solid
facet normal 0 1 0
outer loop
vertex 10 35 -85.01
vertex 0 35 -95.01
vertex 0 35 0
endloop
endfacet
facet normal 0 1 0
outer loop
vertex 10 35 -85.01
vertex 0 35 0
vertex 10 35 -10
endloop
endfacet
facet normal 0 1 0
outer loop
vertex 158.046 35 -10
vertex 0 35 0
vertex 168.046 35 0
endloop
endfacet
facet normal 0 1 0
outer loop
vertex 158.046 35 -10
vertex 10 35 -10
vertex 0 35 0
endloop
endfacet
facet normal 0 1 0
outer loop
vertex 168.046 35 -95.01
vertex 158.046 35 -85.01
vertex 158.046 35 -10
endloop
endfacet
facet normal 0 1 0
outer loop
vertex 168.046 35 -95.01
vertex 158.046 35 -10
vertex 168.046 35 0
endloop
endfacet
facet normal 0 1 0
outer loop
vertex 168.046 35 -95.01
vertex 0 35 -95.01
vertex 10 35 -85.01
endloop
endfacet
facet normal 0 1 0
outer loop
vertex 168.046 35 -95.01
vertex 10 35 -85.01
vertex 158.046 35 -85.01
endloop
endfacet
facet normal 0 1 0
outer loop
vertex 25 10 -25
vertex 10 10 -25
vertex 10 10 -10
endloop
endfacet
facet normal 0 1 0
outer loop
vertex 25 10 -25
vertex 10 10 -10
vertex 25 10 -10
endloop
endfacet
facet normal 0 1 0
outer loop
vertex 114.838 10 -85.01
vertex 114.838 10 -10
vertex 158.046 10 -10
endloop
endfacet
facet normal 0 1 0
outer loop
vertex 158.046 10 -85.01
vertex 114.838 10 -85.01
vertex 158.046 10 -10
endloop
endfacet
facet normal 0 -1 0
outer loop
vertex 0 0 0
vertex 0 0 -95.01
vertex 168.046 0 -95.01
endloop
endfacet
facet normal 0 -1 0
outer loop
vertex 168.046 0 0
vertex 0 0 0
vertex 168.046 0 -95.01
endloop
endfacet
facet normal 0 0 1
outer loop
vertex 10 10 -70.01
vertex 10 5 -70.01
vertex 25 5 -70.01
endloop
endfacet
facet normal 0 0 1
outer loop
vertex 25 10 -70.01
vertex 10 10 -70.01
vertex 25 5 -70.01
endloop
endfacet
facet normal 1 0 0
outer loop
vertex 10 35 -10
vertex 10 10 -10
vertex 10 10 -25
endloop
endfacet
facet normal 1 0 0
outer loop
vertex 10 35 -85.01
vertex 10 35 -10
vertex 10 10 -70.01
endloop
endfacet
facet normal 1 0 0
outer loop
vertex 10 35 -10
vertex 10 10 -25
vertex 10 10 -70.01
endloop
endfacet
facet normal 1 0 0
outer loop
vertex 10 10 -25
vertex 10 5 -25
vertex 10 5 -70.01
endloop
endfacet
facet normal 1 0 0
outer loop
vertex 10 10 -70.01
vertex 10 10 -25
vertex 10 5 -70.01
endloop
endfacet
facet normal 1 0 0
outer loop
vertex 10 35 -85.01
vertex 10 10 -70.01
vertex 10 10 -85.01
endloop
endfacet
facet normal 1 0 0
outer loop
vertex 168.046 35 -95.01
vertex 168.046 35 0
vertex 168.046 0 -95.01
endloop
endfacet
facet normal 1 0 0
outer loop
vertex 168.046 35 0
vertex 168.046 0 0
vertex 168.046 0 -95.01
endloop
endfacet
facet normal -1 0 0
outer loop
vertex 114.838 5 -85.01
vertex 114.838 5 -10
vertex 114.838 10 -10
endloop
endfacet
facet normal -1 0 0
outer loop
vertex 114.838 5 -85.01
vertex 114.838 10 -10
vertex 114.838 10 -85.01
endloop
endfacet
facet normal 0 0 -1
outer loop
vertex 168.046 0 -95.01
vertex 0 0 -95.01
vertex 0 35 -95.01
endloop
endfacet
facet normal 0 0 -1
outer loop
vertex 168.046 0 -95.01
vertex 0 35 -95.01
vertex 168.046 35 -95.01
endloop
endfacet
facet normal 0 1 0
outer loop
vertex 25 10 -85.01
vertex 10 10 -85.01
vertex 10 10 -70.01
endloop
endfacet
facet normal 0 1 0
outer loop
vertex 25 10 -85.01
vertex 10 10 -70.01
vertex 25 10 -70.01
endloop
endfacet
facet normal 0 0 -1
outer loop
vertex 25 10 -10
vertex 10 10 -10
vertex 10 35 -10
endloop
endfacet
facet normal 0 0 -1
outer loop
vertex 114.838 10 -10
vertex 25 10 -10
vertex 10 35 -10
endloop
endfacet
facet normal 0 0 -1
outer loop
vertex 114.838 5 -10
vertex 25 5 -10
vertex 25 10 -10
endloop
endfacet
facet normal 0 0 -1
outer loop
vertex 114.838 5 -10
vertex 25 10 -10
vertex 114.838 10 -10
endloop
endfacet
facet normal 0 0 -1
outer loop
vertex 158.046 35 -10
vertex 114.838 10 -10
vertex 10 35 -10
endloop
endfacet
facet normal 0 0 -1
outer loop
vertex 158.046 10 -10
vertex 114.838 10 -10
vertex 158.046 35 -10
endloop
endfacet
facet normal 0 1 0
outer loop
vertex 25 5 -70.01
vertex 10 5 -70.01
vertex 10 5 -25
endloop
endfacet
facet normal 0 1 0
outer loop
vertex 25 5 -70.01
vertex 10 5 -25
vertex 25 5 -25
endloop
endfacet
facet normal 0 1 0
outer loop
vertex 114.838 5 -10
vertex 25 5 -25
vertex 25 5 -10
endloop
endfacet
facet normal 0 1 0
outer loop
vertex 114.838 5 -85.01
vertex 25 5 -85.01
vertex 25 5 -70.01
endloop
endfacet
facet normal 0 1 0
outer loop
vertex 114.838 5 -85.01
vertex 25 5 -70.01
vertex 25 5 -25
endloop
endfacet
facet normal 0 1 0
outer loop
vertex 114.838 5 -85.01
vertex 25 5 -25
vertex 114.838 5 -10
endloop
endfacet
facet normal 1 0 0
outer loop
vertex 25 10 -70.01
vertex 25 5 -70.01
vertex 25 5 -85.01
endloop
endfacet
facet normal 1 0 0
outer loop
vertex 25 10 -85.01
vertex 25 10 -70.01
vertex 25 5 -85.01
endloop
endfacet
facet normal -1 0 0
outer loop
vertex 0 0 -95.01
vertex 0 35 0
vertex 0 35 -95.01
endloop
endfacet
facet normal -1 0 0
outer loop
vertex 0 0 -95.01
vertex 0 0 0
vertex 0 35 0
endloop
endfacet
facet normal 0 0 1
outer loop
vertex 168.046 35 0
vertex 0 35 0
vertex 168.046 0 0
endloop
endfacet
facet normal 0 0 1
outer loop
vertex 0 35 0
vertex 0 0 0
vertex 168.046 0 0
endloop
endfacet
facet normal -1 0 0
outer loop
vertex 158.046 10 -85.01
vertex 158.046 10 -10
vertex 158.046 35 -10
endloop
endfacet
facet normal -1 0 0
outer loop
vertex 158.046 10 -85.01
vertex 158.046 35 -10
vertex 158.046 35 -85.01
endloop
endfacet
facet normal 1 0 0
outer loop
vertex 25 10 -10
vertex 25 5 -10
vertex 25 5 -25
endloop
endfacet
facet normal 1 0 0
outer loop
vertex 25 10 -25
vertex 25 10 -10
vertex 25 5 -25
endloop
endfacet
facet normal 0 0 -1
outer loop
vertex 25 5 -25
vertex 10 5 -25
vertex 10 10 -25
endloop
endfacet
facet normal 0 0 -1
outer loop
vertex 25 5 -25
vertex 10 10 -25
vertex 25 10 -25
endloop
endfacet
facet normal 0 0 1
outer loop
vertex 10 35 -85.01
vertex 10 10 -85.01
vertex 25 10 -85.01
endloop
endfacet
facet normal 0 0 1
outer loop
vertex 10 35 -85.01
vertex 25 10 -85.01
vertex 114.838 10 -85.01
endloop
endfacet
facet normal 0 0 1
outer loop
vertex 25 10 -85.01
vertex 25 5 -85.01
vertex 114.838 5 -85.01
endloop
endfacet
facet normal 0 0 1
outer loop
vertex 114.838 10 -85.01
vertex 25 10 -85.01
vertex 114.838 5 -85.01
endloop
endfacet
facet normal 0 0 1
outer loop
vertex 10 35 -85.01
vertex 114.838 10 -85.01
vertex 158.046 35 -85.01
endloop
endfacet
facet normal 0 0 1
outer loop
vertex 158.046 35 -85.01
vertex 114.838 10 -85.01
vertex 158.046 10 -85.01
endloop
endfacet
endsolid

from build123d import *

# Parameters (mm, degrees)
SKETCH1_W           = 168.045783506
SKETCH1_H           = 95.010377358
BOSS_EXTRUDE1_DEPTH = 5
SKETCH2_W           = 168.045783506
SKETCH2_H           = 95.010377358
SKETCH2_W_2         = 148.045783506
SKETCH2_H_2         = 75.010377358
BOSS_EXTRUDE2_DEPTH = 30
SKETCH3_W           = 15
SKETCH3_H           = 15
SKETCH3_W_2         = 43.208090913
SKETCH3_H_2         = 75.010377358
BOSS_EXTRUDE3_DEPTH = 5


with BuildPart() as part:
    # Sketch1 → Boss-Extrude1 (new body)
    with BuildSketch(Plane(origin=(0, 0, 0), x_dir=(1, 0, 0), z_dir=(0, 1, 0))):
        with Locations((84.022891753, 47.505188679)):
            Rectangle(SKETCH1_W, SKETCH1_H)
    extrude(amount=BOSS_EXTRUDE1_DEPTH)

    # Sketch2 → Boss-Extrude2 (add)
    with BuildSketch(Plane(origin=(0, 5, 0), x_dir=(1, 0, 0), z_dir=(0, 1, 0))):
        with Locations((84.022891753, 47.505188679)):
            Rectangle(SKETCH2_W, SKETCH2_H)
        with Locations((84.022891753, 47.505188679)):
            Rectangle(SKETCH2_W_2, SKETCH2_H_2, mode=Mode.SUBTRACT)
    extrude(amount=BOSS_EXTRUDE2_DEPTH)

    # Sketch3 → Boss-Extrude3 (add)
    with BuildSketch(Plane(origin=(0, 5, 0), x_dir=(1, 0, 0), z_dir=(0, 1, 0))):
        with Locations((17.5, 77.510377358)):
            Rectangle(SKETCH3_W, SKETCH3_H)
        with Locations((17.5, 17.5)):
            Rectangle(SKETCH3_W, SKETCH3_H)
        with Locations((136.44173805, 47.505188679)):
            Rectangle(SKETCH3_W_2, SKETCH3_H_2)
    extrude(amount=BOSS_EXTRUDE3_DEPTH)


solid = part.part
